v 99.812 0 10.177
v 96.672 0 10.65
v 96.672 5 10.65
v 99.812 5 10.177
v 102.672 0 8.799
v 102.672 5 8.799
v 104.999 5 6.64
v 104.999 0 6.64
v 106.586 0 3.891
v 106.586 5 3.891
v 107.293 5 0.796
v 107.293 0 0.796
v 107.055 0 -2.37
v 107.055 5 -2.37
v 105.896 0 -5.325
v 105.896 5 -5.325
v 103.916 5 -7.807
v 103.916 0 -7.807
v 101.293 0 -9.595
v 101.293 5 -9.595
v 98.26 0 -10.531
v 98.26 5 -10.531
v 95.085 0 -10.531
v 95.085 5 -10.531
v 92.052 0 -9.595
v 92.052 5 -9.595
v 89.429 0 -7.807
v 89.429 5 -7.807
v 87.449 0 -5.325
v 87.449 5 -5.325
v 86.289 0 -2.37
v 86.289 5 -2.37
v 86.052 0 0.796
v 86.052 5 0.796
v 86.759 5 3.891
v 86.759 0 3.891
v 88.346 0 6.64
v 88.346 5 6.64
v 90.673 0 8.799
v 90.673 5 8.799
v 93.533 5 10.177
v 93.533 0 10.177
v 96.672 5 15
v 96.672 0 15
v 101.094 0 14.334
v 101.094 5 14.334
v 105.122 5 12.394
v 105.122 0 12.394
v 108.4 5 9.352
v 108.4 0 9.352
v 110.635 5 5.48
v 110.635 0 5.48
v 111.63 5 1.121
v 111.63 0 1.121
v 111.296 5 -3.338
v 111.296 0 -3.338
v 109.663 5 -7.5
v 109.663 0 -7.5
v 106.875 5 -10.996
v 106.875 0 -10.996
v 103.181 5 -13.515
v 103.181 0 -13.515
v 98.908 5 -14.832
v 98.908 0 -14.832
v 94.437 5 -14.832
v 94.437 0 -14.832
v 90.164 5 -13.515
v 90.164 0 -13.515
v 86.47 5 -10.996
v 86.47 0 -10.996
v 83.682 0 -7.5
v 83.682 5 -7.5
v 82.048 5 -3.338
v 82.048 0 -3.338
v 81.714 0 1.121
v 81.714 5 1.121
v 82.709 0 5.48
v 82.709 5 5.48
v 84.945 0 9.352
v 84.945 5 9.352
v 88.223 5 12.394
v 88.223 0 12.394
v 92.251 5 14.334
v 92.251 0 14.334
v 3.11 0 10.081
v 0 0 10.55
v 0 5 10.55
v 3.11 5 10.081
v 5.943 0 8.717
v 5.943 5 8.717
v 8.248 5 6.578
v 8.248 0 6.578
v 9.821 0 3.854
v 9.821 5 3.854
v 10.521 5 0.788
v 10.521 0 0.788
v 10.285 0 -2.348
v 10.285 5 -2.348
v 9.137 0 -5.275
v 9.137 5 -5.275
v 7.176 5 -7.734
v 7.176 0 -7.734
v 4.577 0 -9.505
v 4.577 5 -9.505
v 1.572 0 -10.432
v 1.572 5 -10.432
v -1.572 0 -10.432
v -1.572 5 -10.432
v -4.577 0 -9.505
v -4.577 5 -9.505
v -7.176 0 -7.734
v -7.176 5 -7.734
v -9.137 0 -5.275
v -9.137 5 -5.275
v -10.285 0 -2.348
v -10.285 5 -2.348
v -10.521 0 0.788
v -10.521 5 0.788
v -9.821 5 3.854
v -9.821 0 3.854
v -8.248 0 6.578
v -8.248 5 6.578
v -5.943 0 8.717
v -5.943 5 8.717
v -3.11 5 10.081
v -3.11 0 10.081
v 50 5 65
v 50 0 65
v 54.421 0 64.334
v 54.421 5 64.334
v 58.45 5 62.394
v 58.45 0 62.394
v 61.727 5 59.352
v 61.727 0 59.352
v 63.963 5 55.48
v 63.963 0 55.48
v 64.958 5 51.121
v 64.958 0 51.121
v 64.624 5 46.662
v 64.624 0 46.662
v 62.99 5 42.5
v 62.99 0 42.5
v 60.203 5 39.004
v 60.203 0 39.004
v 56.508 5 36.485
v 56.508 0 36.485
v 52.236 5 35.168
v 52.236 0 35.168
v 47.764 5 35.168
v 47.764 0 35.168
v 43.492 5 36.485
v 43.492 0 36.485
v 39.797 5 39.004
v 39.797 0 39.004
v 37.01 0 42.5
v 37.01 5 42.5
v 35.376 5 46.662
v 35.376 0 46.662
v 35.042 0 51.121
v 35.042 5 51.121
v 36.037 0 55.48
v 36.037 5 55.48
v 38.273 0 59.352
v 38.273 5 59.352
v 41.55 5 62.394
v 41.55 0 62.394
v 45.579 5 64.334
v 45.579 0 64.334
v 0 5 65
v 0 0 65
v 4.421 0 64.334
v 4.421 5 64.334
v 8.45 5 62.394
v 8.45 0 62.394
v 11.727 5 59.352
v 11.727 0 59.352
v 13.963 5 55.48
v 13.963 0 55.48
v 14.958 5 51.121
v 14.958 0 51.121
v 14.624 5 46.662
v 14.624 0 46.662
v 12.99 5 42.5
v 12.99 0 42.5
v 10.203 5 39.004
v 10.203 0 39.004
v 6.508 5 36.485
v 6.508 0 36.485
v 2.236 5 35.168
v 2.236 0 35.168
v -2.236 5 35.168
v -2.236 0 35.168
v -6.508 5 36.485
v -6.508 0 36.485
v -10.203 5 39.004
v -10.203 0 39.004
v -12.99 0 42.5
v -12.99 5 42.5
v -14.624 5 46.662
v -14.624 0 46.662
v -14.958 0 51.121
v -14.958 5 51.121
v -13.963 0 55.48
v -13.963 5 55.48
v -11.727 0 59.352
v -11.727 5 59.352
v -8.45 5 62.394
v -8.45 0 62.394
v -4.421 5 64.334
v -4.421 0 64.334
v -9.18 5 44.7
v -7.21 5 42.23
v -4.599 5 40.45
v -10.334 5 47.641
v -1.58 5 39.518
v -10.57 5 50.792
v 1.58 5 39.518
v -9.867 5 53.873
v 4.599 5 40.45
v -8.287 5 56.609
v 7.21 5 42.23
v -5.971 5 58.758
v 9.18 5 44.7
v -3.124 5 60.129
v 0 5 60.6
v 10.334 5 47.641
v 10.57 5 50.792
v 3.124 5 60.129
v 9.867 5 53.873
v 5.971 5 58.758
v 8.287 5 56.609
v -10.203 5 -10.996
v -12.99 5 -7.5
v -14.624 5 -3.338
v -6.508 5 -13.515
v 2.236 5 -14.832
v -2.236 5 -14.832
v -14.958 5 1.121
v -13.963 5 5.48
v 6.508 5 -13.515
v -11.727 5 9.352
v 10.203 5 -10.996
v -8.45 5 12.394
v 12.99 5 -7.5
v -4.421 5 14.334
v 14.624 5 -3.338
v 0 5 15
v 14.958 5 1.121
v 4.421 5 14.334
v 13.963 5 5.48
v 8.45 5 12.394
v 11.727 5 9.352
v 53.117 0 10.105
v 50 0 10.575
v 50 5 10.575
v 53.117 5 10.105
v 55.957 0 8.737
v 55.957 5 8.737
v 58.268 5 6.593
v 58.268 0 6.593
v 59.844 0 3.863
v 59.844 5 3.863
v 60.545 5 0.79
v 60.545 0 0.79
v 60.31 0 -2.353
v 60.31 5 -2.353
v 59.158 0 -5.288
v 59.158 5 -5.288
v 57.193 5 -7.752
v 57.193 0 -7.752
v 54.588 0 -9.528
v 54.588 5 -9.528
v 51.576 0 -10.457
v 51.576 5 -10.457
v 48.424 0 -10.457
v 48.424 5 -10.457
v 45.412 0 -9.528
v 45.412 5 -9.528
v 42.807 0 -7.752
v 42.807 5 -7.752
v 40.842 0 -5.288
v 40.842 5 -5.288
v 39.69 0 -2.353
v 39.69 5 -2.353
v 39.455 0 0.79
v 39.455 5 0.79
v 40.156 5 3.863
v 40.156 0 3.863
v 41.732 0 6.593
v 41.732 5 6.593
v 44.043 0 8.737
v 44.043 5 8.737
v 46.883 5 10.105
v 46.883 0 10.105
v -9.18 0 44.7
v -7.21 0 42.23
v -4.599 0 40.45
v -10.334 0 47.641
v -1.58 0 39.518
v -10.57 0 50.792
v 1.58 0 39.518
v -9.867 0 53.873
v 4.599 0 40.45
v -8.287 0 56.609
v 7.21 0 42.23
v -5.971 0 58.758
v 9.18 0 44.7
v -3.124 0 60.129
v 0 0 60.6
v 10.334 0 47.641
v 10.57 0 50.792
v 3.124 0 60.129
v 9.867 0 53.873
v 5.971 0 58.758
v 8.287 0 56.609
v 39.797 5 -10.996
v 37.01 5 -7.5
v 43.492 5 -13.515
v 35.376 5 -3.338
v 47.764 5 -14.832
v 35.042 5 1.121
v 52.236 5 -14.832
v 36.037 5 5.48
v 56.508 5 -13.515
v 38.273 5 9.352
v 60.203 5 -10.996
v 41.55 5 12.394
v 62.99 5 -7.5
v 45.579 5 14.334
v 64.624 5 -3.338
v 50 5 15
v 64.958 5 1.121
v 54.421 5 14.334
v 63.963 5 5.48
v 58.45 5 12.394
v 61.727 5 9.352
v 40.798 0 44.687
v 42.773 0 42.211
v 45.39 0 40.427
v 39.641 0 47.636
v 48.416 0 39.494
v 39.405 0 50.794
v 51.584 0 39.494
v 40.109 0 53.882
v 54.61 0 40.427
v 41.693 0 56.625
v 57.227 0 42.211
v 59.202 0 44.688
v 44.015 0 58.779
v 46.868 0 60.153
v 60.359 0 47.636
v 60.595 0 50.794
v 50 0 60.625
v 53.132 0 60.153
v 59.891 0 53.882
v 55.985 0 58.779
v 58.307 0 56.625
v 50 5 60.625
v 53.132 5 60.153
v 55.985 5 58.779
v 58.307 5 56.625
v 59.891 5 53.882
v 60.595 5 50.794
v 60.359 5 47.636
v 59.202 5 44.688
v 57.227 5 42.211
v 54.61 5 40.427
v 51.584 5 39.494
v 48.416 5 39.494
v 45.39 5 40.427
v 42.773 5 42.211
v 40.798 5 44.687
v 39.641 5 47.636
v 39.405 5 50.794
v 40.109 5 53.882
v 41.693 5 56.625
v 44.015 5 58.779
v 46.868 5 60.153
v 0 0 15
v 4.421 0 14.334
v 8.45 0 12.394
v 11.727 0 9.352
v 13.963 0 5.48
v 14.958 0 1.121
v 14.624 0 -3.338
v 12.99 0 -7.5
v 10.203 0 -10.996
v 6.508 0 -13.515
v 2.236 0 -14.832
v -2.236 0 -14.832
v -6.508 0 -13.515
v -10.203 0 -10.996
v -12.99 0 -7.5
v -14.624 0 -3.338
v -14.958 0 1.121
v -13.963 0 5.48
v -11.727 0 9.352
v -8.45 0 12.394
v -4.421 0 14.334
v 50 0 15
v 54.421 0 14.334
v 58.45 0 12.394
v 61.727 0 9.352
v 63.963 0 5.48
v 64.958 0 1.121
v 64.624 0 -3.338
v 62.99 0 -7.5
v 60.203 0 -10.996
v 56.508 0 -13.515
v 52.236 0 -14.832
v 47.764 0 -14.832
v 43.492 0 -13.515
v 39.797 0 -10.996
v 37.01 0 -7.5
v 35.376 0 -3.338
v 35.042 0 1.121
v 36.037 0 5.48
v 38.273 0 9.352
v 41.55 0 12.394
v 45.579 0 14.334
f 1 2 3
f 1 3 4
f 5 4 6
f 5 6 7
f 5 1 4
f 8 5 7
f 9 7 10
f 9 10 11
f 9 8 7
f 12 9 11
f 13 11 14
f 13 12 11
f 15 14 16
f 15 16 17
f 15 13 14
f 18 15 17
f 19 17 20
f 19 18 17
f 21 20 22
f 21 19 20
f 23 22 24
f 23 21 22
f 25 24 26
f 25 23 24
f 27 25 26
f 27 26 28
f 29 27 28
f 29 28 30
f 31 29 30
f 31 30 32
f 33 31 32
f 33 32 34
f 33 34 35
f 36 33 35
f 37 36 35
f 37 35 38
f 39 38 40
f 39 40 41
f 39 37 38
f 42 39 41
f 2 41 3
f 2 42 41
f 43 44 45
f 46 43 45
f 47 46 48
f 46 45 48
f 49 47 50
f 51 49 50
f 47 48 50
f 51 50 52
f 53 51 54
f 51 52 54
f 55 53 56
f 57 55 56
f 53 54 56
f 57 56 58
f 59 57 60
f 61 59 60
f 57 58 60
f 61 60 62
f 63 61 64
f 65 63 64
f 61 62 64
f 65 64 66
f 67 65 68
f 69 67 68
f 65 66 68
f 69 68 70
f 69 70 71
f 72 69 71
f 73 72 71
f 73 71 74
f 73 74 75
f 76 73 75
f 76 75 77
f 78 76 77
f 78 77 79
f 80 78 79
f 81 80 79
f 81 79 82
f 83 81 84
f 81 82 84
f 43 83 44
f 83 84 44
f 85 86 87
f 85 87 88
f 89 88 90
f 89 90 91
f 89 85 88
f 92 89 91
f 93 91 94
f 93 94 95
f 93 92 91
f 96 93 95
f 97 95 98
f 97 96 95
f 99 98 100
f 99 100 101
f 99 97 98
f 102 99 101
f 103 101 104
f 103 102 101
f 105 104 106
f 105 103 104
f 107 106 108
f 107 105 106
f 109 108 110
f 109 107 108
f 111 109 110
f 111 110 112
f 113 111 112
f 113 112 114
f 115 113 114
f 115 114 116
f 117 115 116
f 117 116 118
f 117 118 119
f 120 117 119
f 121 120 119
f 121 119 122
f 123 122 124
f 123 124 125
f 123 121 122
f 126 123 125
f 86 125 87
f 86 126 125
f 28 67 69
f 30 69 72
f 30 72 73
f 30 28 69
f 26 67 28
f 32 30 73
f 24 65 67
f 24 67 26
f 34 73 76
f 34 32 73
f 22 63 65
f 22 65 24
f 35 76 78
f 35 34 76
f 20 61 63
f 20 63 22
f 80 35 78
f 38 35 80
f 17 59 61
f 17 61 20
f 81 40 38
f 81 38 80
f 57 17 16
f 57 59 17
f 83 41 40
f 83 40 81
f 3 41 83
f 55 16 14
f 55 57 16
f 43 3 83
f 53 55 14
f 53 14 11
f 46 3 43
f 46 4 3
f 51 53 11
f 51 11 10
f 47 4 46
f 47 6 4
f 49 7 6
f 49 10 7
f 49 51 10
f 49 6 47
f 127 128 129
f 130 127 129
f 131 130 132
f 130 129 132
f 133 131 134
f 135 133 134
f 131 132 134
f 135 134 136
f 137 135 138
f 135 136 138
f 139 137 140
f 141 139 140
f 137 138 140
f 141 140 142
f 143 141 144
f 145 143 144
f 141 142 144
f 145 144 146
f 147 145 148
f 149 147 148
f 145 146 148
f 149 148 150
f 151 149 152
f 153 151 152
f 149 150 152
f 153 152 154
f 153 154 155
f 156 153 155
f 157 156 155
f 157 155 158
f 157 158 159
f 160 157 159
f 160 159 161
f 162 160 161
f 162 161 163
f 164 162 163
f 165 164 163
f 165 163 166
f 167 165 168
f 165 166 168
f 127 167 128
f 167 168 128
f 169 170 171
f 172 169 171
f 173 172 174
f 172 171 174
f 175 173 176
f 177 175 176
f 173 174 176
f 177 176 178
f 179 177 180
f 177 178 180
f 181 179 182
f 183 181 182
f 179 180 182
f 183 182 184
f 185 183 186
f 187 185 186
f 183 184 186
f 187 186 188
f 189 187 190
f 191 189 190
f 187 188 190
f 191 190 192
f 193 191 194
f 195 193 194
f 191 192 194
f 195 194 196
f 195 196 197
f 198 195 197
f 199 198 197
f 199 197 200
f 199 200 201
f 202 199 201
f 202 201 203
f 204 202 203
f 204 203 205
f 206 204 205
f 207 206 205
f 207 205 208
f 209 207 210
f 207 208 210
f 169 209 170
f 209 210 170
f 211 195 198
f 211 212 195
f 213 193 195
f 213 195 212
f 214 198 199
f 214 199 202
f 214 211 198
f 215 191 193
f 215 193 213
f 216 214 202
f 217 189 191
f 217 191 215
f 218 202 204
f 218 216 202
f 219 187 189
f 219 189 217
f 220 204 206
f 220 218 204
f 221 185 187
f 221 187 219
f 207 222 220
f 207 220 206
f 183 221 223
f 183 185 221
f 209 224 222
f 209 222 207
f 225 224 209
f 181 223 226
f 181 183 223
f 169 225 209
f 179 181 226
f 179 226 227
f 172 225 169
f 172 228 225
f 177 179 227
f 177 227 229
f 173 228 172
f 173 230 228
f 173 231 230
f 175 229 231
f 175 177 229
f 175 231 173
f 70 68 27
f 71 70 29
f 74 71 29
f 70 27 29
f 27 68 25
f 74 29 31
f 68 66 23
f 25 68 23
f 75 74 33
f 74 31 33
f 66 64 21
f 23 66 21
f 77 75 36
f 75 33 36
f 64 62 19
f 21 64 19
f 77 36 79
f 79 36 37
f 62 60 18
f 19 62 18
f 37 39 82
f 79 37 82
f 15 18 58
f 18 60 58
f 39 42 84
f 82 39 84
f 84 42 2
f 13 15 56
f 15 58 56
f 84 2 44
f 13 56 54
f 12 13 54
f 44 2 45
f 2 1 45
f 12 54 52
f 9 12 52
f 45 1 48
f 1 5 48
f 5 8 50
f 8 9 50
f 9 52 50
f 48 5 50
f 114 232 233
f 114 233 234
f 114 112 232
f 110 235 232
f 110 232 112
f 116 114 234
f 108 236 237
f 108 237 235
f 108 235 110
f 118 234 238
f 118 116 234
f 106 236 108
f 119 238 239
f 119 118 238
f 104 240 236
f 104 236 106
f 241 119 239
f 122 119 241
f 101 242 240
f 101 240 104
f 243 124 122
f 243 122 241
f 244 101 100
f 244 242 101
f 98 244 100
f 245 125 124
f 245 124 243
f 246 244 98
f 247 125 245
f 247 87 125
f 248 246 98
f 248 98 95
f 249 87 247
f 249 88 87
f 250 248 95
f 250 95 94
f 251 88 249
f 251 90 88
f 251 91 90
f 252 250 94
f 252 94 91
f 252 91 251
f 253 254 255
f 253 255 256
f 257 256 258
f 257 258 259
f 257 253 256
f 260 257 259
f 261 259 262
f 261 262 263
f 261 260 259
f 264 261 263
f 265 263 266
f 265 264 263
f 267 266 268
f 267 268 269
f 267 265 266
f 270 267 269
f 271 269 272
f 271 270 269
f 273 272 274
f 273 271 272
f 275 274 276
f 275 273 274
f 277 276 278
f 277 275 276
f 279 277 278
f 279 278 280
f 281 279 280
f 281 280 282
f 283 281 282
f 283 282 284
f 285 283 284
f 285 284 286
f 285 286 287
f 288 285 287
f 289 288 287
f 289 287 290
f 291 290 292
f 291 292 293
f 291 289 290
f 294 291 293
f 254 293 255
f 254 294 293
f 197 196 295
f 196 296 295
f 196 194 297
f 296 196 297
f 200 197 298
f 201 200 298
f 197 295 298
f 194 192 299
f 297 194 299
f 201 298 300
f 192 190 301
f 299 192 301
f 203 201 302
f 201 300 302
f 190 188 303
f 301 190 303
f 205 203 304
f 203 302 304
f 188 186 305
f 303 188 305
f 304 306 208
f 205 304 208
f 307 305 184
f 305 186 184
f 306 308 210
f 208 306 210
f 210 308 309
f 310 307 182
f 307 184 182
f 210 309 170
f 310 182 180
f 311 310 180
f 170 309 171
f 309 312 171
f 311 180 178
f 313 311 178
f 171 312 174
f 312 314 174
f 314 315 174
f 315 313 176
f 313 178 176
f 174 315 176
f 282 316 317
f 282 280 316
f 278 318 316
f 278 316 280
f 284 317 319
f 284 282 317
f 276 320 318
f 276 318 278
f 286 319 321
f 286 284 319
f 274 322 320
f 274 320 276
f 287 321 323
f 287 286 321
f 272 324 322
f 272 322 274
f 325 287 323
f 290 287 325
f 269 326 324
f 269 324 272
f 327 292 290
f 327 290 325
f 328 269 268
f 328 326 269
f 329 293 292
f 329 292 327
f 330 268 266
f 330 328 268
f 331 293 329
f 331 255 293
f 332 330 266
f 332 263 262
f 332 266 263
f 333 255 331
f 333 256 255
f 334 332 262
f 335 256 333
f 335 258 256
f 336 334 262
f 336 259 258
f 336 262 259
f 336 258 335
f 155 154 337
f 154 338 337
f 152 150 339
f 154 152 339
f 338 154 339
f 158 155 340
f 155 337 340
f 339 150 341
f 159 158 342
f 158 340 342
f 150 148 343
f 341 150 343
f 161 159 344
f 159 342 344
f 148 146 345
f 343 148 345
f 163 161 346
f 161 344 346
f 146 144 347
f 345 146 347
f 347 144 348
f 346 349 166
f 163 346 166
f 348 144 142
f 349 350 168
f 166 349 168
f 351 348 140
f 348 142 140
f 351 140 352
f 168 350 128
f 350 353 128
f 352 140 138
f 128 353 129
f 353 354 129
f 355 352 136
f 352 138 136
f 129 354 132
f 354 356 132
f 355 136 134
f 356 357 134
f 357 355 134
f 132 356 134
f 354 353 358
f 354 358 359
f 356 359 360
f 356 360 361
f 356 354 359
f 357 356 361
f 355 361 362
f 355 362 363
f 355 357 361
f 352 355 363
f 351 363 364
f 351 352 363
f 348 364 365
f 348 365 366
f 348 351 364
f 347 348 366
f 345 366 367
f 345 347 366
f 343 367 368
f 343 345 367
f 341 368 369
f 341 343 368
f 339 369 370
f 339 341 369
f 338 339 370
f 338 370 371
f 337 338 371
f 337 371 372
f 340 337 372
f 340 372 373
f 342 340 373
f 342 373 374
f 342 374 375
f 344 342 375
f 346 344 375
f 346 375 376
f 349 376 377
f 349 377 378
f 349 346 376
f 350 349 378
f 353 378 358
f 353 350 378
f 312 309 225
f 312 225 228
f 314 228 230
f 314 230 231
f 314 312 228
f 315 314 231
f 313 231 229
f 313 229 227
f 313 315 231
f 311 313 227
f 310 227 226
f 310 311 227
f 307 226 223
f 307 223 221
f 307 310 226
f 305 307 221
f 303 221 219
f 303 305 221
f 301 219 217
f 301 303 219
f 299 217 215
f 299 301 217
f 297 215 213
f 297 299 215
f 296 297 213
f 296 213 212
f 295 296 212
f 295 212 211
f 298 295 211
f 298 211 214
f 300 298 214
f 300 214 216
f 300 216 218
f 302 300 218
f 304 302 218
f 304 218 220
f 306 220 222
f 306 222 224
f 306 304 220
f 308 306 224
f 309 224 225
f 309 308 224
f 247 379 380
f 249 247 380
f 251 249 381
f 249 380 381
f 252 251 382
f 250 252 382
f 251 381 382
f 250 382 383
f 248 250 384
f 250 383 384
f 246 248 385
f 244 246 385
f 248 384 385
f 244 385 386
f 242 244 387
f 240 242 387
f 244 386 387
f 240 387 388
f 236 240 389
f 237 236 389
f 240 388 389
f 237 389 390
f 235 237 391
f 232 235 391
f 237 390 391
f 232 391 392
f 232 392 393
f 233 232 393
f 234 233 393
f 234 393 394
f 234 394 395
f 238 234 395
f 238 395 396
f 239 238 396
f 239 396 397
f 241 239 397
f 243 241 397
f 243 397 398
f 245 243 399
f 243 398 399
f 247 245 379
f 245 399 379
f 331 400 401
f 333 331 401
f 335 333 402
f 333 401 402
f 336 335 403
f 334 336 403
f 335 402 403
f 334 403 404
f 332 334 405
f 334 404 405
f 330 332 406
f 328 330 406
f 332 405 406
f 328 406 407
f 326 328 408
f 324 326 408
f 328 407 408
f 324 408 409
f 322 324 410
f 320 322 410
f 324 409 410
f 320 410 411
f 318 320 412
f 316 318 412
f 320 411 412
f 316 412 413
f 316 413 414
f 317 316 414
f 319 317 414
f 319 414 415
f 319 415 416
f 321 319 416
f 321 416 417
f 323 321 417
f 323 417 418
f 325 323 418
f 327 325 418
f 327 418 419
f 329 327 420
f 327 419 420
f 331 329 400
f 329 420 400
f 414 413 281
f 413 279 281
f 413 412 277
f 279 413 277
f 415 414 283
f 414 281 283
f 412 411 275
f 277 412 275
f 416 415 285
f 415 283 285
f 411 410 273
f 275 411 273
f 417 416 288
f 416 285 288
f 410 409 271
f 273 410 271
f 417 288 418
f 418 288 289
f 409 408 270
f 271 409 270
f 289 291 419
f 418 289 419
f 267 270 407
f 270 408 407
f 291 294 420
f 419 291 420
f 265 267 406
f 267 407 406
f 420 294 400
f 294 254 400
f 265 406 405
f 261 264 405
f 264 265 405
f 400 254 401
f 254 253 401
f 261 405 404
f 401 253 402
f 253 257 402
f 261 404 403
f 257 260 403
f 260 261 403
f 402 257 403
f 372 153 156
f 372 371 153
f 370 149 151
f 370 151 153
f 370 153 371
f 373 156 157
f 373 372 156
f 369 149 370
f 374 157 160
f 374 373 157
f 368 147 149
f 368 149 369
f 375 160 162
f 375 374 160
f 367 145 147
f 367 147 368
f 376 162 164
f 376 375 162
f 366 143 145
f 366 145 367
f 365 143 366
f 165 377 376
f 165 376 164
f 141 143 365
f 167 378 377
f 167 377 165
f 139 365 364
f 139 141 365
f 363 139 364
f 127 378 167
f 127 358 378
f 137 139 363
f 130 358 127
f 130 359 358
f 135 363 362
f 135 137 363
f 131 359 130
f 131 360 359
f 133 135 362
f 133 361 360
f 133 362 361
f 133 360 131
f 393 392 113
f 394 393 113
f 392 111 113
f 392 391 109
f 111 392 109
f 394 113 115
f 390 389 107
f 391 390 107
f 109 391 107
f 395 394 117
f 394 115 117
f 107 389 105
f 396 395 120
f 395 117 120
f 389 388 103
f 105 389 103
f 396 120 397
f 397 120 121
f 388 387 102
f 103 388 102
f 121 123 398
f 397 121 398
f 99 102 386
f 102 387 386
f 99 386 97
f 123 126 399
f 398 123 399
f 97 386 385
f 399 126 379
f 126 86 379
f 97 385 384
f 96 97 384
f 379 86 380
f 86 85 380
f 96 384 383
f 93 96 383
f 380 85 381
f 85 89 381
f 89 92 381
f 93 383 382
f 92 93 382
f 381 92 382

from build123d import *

# Parameters (mm, degrees)
SKETCH1_R             = 15
SKETCH1_R_2           = 10.55
BOSS_EXTRUDE1_DEPTH   = 5
SKETCH1_R_3           = 10.575
BOSS_EXTRUDE1_2_DEPTH = 5
SKETCH1_R_4           = 10.6
BOSS_EXTRUDE1_3_DEPTH = 5
SKETCH1_R_5           = 10.625
BOSS_EXTRUDE1_4_DEPTH = 5
SKETCH1_R_6           = 10.65
BOSS_EXTRUDE1_5_DEPTH = 5


with BuildPart() as part:
    # Sketch1 → Boss-Extrude1 (new body)
    with BuildSketch(Plane(origin=(0, 0, 0), x_dir=(1, 0, 0), z_dir=(0, 1, 0))):
        with Locations(Location((0, 0, 0), (0, 0, 270))):
            Circle(SKETCH1_R)
        with Locations(Location((0, 0, 0), (0, 0, 270))):
            Circle(SKETCH1_R_2, mode=Mode.SUBTRACT)
    extrude(amount=BOSS_EXTRUDE1_DEPTH)


with BuildPart() as body_2:
    # Sketch1 → Boss-Extrude1 2 (new body)
    with BuildSketch(Plane(origin=(0, 0, 0), x_dir=(1, 0, 0), z_dir=(0, 1, 0))):
        with Locations(Location((50, 0, 0), (0, 0, 270))):
            Circle(SKETCH1_R)
        with Locations(Location((50, 0, 0), (0, 0, 270))):
            Circle(SKETCH1_R_3, mode=Mode.SUBTRACT)
    extrude(amount=BOSS_EXTRUDE1_2_DEPTH)


with BuildPart() as body_3:
    # Sketch1 → Boss-Extrude1 3 (new body)
    with BuildSketch(Plane(origin=(0, 0, 0), x_dir=(1, 0, 0), z_dir=(0, 1, 0))):
        with Locations(Location((0, -50, 0), (0, 0, 270))):
            Circle(SKETCH1_R)
        with Locations(Location((0, -50, 0), (0, 0, 270))):
            Circle(SKETCH1_R_4, mode=Mode.SUBTRACT)
    extrude(amount=BOSS_EXTRUDE1_3_DEPTH)


with BuildPart() as body_4:
    # Sketch1 → Boss-Extrude1 4 (new body)
    with BuildSketch(Plane(origin=(0, 0, 0), x_dir=(1, 0, 0), z_dir=(0, 1, 0))):
        with Locations(Location((50, -50, 0), (0, 0, 270))):
            Circle(SKETCH1_R)
        with Locations(Location((50, -50, 0), (0, 0, 270))):
            Circle(SKETCH1_R_5, mode=Mode.SUBTRACT)
    extrude(amount=BOSS_EXTRUDE1_4_DEPTH)


with BuildPart() as body_5:
    # Sketch1 → Boss-Extrude1 5 (new body)
    with BuildSketch(Plane(origin=(0, 0, 0), x_dir=(1, 0, 0), z_dir=(0, 1, 0))):
        with Locations(Location((96.672369259, 0, 0), (0, 0, 270))):
            Circle(SKETCH1_R)
        with Locations(Location((96.672369259, 0, 0), (0, 0, 270))):
            Circle(SKETCH1_R_6, mode=Mode.SUBTRACT)
    extrude(amount=BOSS_EXTRUDE1_5_DEPTH)


solid = Compound([part.part, body_2.part, body_3.part, body_4.part, body_5.part])
